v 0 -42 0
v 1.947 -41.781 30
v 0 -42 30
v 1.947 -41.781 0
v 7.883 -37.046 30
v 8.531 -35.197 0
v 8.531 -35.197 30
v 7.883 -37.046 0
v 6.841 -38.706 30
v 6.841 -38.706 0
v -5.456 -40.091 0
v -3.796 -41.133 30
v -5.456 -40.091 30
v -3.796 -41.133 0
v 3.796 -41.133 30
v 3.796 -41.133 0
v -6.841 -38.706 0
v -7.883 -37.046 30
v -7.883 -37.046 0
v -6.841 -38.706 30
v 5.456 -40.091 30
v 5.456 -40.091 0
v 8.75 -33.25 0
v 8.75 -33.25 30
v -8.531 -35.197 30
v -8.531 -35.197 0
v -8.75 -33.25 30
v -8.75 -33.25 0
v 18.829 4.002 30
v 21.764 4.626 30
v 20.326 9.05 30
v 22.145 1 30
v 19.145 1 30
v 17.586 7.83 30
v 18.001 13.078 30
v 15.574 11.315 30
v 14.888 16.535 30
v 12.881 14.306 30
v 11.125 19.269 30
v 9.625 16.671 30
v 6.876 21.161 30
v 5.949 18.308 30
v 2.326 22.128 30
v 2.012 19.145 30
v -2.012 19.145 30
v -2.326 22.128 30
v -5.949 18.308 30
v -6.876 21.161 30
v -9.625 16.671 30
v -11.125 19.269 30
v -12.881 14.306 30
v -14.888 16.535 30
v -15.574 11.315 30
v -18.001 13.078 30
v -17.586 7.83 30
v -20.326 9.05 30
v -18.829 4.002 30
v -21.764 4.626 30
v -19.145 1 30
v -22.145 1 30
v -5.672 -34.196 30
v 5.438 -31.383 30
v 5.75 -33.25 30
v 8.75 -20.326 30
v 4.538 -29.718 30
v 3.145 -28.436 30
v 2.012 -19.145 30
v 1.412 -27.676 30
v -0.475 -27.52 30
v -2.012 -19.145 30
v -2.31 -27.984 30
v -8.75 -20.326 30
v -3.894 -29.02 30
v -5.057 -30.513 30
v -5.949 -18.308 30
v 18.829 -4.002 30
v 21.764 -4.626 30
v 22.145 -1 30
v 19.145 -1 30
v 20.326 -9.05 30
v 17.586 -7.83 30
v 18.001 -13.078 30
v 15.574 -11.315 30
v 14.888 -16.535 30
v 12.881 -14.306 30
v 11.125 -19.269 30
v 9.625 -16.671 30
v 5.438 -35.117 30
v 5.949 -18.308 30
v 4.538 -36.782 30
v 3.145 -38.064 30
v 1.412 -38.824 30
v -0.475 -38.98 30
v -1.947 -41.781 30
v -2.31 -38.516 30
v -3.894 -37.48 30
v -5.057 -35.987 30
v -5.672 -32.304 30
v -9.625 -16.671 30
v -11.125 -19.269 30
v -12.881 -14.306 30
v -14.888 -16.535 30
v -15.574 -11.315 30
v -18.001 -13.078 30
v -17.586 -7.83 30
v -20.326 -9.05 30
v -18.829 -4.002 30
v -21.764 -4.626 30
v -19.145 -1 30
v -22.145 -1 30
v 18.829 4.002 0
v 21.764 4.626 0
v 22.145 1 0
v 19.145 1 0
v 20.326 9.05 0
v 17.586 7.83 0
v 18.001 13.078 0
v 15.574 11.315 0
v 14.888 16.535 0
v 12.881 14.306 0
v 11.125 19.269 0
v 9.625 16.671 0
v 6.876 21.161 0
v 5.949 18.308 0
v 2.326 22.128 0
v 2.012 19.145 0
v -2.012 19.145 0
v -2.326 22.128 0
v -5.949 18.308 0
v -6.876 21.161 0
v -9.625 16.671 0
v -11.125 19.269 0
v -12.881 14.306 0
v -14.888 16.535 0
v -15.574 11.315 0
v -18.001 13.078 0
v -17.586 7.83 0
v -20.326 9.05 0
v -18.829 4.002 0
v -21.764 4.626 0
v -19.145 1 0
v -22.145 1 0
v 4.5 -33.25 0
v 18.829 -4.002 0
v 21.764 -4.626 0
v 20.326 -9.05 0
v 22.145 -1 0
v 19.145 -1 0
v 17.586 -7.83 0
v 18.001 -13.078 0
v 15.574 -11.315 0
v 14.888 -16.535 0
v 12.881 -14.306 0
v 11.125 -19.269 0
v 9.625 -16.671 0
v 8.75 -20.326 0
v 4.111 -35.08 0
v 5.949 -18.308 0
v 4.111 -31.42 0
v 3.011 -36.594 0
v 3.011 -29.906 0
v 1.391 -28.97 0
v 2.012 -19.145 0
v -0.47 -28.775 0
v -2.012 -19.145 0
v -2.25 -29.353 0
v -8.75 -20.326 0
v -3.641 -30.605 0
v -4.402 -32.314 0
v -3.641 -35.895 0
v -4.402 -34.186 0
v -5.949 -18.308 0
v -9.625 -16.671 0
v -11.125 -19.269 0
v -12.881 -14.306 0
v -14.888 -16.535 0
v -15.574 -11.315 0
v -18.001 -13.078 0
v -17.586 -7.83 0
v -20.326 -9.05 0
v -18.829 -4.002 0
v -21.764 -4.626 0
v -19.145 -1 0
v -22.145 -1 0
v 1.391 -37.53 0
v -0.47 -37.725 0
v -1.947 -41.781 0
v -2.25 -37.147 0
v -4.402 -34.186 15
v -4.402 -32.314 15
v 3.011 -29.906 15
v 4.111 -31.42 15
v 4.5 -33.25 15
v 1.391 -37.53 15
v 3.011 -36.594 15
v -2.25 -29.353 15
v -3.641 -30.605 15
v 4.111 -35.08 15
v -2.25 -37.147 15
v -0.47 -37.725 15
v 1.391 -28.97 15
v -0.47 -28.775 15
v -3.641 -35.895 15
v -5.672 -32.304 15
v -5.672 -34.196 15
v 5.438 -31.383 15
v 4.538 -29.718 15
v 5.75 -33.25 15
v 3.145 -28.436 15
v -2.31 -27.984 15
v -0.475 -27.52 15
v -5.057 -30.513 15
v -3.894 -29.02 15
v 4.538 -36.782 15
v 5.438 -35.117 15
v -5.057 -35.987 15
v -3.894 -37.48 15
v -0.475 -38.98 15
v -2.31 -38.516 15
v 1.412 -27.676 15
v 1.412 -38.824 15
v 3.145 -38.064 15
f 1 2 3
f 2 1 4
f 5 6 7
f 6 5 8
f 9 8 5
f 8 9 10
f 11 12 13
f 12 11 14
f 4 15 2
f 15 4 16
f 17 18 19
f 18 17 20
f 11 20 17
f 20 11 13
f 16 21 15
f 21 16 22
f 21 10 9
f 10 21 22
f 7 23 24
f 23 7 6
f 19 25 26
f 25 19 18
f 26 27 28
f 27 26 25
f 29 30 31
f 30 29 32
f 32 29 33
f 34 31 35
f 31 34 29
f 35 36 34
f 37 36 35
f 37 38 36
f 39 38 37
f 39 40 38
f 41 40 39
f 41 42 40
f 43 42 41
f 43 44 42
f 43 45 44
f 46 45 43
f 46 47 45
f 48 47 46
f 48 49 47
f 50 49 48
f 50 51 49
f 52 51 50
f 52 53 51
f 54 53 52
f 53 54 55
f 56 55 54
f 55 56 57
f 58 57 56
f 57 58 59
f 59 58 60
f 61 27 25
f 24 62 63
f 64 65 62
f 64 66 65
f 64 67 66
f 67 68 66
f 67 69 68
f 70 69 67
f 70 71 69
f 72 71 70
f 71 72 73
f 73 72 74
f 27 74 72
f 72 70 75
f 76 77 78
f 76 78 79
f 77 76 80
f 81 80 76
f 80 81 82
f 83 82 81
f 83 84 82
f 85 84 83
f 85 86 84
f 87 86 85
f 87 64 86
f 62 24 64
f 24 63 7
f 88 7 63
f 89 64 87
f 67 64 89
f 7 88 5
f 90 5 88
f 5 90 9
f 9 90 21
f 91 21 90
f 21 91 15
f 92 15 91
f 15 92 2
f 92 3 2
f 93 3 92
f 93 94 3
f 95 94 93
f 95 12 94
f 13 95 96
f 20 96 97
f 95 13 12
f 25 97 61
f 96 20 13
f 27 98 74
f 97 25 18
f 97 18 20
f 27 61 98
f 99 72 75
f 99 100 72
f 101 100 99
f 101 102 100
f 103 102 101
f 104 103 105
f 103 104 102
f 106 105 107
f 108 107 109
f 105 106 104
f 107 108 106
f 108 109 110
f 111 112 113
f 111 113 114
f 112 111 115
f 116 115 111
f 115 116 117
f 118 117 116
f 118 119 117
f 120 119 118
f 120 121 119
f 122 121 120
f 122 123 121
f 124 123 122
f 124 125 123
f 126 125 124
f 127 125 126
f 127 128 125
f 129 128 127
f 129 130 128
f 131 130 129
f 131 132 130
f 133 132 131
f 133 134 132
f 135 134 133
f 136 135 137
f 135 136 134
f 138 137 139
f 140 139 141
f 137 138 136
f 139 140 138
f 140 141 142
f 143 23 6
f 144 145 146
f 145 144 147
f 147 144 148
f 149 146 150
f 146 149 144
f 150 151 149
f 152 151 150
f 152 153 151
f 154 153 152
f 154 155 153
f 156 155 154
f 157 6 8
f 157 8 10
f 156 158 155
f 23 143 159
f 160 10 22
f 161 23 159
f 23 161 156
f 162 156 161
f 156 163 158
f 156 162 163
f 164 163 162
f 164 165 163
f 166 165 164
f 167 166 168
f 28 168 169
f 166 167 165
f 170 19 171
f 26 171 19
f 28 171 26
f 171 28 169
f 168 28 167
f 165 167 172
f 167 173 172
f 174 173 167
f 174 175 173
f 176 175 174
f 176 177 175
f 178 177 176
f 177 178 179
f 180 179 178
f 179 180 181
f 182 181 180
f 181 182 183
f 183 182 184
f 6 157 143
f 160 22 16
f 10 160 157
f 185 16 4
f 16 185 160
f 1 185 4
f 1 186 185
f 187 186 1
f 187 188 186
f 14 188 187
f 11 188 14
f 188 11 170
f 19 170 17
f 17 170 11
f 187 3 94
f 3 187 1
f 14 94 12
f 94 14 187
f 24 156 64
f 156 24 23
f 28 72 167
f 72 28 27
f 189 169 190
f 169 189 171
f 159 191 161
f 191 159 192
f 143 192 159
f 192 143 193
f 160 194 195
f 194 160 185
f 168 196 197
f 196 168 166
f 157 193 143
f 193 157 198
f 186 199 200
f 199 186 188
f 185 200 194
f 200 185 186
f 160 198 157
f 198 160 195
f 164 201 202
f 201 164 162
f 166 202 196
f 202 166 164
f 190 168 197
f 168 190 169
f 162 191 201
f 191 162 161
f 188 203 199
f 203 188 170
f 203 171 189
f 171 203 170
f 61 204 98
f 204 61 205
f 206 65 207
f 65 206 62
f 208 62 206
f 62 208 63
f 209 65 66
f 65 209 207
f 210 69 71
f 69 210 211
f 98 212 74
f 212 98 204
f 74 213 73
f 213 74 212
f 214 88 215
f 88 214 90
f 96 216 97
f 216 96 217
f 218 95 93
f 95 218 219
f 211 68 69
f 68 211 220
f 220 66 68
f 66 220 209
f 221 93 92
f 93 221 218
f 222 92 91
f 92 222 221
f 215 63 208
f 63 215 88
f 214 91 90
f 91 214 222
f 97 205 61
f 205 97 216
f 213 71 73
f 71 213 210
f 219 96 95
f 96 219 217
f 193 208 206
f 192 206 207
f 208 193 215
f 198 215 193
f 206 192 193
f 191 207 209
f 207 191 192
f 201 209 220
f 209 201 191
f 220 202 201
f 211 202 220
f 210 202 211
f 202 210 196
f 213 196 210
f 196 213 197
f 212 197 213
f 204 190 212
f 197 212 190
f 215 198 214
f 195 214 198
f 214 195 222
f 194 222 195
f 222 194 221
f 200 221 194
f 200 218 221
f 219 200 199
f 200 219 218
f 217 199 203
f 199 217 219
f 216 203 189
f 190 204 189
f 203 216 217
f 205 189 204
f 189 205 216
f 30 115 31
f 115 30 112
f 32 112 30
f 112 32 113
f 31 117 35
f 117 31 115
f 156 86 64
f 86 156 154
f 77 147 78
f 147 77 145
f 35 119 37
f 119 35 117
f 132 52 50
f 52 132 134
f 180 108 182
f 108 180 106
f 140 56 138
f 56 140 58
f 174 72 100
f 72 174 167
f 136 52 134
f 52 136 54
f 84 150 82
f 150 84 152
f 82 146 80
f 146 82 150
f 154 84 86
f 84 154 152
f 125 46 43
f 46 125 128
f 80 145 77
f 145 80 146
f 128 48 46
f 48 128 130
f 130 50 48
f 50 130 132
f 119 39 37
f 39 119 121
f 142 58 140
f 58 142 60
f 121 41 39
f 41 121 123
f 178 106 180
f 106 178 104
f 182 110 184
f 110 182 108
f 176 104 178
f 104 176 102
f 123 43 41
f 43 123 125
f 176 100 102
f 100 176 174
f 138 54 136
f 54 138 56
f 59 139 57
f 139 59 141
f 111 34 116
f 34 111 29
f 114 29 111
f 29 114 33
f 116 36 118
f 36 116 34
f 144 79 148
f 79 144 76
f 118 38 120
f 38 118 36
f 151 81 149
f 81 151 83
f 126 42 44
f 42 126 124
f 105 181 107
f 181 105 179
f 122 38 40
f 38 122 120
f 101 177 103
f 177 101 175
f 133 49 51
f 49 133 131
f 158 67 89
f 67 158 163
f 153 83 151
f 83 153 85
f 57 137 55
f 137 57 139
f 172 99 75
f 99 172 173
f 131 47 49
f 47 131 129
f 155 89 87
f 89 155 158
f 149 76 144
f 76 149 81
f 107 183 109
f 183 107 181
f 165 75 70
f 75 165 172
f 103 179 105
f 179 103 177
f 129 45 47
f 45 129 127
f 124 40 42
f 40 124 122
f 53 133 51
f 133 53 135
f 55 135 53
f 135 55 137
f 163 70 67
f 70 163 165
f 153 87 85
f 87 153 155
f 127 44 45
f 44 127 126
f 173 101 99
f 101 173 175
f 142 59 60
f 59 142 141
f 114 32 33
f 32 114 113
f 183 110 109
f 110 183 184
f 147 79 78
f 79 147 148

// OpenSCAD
frame_diameter = 38.5;
screw_diameter = 5;
screw_head_diameter = 8.5;
screw_head_depth = 3;
screw_nut_size = 8.2;
screw_nut_depth = 3;
cut_size = 2.0;


height = 30;
thickness = 3;
frame_pedal_mount_dist = 14;
pedal_mount_diam_1 = 11.5;
pedal_mount_depth_1 = 15.0;
pedal_mount_diam_2 = 9.0;


module pedal_mount() {
    difference() {
        union() {
            cylinder(h=height, r=pedal_mount_diam_1/2+thickness);
            translate([-(pedal_mount_diam_1/2+thickness),0,0])
            cube([pedal_mount_diam_1+thickness*2,frame_diameter/2+frame_pedal_mount_dist,height]);
        }

        translate([0,0,-0.5])
        cylinder(h=height+1, r=pedal_mount_diam_2/2);
        
        translate([0,0,height-pedal_mount_depth_1])
        cylinder(h=height+1, r=pedal_mount_diam_1/2);
    }
}









difference() {
   union() {
       cylinder(h=height, r=(frame_diameter/2)+thickness); 
       translate([0,-(frame_pedal_mount_dist+frame_diameter/2),0])
           pedal_mount();
   }   
   translate([0,0,-0.5]) {
       cylinder(h=height+1, r=frame_diameter/2);
       translate([-frame_diameter,-cut_size/2, -height]) 
           cube([2*frame_diameter, cut_size,3*height]);
   }
 }
